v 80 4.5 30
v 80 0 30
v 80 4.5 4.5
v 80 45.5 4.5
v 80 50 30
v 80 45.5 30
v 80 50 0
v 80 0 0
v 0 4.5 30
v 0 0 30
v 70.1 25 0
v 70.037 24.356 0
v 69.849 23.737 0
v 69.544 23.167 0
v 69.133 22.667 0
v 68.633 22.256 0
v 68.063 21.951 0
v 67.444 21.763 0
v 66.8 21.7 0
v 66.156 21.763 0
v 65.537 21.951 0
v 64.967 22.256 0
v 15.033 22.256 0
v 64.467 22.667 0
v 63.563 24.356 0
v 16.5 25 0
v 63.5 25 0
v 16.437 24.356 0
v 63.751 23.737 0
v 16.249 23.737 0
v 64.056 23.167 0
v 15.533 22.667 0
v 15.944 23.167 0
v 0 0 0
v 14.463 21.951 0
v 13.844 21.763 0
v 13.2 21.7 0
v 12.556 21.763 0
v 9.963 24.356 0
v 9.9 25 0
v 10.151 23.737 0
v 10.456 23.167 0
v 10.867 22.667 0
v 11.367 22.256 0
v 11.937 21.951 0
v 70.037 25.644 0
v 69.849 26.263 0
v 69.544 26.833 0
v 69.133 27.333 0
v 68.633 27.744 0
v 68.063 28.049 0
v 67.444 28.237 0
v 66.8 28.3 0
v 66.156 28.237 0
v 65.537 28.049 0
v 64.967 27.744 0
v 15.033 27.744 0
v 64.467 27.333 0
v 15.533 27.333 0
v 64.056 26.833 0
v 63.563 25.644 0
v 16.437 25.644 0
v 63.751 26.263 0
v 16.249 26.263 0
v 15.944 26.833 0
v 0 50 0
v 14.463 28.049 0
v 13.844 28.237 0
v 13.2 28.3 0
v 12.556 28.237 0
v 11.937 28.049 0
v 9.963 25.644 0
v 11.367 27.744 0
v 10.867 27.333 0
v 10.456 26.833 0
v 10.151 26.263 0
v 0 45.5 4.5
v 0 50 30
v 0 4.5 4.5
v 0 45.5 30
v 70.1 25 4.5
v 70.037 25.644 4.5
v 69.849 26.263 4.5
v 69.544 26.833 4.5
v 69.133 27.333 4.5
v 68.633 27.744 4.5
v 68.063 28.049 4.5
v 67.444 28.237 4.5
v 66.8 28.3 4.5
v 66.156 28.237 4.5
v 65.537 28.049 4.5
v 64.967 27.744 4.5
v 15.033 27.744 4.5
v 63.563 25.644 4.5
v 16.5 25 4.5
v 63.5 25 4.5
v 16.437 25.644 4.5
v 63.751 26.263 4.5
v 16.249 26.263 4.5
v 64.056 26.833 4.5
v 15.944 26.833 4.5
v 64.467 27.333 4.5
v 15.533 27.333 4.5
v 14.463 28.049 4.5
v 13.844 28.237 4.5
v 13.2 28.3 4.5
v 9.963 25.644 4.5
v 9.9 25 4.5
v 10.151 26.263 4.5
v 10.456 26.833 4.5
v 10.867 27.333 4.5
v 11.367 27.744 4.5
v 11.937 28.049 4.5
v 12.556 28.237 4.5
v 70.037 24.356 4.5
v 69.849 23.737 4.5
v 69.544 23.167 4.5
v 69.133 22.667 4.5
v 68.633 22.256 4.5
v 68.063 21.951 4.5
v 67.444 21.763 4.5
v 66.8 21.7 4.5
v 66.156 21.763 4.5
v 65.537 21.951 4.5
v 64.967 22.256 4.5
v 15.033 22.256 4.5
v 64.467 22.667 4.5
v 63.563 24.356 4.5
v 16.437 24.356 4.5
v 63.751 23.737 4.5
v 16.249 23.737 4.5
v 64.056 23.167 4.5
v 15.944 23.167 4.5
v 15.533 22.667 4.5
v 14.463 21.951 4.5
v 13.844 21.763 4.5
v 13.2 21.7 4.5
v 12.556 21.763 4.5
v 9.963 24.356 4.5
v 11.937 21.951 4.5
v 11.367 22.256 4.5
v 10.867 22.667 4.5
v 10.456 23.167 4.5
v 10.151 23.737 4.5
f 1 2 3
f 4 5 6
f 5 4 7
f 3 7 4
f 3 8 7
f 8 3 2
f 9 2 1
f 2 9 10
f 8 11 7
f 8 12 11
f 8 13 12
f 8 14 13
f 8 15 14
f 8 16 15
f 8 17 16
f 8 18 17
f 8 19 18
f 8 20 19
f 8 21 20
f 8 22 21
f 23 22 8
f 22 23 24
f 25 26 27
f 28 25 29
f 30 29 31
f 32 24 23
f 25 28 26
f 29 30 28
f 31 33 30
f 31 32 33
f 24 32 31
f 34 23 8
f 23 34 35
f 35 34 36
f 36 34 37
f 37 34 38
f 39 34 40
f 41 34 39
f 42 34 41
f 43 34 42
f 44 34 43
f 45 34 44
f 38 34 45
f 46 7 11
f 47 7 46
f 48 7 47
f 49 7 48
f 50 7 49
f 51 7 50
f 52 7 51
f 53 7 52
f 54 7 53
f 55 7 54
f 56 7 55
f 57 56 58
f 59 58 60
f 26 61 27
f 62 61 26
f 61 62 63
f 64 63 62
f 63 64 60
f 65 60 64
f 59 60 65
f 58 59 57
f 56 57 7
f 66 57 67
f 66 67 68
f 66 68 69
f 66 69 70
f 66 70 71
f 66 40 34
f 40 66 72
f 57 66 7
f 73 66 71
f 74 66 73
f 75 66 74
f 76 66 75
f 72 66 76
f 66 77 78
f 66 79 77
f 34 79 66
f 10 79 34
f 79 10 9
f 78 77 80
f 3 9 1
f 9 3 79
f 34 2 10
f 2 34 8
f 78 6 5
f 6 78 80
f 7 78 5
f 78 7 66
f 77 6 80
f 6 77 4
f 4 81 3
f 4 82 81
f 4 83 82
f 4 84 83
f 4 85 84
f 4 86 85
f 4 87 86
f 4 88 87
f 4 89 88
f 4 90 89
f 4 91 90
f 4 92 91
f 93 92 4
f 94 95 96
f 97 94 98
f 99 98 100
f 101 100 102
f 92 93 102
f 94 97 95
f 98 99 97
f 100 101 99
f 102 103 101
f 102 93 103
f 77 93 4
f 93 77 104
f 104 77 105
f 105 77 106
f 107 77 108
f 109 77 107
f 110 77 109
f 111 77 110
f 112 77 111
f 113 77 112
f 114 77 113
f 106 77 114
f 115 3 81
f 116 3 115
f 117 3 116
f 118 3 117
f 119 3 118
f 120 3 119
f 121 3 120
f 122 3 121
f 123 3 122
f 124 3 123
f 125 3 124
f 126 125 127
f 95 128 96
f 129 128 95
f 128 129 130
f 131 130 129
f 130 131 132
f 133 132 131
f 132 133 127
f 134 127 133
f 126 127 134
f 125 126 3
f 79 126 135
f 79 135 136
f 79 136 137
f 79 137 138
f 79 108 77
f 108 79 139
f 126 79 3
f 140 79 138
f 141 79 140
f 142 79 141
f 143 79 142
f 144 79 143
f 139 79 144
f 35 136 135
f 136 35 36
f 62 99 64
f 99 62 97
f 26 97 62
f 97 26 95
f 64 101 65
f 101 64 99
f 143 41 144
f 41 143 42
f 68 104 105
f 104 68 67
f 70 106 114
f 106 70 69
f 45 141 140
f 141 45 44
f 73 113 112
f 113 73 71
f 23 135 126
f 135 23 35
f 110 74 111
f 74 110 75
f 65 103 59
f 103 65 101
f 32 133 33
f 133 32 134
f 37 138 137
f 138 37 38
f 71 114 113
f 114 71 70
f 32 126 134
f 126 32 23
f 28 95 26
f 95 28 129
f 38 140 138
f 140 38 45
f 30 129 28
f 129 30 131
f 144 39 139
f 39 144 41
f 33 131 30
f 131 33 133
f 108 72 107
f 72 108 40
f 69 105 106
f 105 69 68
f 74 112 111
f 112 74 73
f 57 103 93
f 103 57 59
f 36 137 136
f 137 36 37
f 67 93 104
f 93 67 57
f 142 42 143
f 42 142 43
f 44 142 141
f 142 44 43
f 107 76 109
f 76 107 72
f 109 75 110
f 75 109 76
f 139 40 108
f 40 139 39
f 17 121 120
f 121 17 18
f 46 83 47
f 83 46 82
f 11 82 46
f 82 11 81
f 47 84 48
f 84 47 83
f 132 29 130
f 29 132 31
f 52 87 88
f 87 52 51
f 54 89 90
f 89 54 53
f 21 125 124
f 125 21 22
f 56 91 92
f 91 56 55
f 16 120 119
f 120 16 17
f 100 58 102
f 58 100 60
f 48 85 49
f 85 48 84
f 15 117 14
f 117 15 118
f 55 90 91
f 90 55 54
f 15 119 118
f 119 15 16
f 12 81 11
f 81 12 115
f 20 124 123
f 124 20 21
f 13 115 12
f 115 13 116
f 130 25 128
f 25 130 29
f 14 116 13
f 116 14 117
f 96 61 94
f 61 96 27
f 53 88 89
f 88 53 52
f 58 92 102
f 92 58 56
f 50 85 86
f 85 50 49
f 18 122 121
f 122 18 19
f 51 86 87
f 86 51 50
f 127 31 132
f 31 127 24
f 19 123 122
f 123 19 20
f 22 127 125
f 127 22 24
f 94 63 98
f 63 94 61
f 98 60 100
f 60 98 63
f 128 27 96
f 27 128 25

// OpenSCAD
$fn = 32;

// ----------------------------------------------------------------------
// U-bracket: 80 x 50 x 30 mm
// ----------------------------------------------------------------------

// --- parameters (mm) ---
rail_len = 80;            // outer length, X
jaw_w = 50;               // outer width, Y
jaw_h = 30;               // upright height, Z
web_t = 4.5;              // wall thickness
hole_d = 6.6;             // clearance for M6

module hole_z(px, py) {
  translate([px, py, -2.5]) cylinder(h = web_t + 5, d = hole_d);
}
module hole_y_pz(pz) {
  /* through both uprights along Y */
  translate([0, -2.5, pz]) rotate([-90, 0, 0]) cylinder(h = jaw_w + 5, d = hole_d);
}

module base() {
  cube([rail_len, jaw_w, web_t]);
}

module uprights() {
  cube([rail_len, web_t, jaw_h]);
  translate([0, jaw_w - web_t, 0]) cube([rail_len, web_t, jaw_h]);
}

difference() {
  union() {
    base();
    uprights();
  }
  hole_z(13.2, 25);
  hole_z(66.8, 25);
}
